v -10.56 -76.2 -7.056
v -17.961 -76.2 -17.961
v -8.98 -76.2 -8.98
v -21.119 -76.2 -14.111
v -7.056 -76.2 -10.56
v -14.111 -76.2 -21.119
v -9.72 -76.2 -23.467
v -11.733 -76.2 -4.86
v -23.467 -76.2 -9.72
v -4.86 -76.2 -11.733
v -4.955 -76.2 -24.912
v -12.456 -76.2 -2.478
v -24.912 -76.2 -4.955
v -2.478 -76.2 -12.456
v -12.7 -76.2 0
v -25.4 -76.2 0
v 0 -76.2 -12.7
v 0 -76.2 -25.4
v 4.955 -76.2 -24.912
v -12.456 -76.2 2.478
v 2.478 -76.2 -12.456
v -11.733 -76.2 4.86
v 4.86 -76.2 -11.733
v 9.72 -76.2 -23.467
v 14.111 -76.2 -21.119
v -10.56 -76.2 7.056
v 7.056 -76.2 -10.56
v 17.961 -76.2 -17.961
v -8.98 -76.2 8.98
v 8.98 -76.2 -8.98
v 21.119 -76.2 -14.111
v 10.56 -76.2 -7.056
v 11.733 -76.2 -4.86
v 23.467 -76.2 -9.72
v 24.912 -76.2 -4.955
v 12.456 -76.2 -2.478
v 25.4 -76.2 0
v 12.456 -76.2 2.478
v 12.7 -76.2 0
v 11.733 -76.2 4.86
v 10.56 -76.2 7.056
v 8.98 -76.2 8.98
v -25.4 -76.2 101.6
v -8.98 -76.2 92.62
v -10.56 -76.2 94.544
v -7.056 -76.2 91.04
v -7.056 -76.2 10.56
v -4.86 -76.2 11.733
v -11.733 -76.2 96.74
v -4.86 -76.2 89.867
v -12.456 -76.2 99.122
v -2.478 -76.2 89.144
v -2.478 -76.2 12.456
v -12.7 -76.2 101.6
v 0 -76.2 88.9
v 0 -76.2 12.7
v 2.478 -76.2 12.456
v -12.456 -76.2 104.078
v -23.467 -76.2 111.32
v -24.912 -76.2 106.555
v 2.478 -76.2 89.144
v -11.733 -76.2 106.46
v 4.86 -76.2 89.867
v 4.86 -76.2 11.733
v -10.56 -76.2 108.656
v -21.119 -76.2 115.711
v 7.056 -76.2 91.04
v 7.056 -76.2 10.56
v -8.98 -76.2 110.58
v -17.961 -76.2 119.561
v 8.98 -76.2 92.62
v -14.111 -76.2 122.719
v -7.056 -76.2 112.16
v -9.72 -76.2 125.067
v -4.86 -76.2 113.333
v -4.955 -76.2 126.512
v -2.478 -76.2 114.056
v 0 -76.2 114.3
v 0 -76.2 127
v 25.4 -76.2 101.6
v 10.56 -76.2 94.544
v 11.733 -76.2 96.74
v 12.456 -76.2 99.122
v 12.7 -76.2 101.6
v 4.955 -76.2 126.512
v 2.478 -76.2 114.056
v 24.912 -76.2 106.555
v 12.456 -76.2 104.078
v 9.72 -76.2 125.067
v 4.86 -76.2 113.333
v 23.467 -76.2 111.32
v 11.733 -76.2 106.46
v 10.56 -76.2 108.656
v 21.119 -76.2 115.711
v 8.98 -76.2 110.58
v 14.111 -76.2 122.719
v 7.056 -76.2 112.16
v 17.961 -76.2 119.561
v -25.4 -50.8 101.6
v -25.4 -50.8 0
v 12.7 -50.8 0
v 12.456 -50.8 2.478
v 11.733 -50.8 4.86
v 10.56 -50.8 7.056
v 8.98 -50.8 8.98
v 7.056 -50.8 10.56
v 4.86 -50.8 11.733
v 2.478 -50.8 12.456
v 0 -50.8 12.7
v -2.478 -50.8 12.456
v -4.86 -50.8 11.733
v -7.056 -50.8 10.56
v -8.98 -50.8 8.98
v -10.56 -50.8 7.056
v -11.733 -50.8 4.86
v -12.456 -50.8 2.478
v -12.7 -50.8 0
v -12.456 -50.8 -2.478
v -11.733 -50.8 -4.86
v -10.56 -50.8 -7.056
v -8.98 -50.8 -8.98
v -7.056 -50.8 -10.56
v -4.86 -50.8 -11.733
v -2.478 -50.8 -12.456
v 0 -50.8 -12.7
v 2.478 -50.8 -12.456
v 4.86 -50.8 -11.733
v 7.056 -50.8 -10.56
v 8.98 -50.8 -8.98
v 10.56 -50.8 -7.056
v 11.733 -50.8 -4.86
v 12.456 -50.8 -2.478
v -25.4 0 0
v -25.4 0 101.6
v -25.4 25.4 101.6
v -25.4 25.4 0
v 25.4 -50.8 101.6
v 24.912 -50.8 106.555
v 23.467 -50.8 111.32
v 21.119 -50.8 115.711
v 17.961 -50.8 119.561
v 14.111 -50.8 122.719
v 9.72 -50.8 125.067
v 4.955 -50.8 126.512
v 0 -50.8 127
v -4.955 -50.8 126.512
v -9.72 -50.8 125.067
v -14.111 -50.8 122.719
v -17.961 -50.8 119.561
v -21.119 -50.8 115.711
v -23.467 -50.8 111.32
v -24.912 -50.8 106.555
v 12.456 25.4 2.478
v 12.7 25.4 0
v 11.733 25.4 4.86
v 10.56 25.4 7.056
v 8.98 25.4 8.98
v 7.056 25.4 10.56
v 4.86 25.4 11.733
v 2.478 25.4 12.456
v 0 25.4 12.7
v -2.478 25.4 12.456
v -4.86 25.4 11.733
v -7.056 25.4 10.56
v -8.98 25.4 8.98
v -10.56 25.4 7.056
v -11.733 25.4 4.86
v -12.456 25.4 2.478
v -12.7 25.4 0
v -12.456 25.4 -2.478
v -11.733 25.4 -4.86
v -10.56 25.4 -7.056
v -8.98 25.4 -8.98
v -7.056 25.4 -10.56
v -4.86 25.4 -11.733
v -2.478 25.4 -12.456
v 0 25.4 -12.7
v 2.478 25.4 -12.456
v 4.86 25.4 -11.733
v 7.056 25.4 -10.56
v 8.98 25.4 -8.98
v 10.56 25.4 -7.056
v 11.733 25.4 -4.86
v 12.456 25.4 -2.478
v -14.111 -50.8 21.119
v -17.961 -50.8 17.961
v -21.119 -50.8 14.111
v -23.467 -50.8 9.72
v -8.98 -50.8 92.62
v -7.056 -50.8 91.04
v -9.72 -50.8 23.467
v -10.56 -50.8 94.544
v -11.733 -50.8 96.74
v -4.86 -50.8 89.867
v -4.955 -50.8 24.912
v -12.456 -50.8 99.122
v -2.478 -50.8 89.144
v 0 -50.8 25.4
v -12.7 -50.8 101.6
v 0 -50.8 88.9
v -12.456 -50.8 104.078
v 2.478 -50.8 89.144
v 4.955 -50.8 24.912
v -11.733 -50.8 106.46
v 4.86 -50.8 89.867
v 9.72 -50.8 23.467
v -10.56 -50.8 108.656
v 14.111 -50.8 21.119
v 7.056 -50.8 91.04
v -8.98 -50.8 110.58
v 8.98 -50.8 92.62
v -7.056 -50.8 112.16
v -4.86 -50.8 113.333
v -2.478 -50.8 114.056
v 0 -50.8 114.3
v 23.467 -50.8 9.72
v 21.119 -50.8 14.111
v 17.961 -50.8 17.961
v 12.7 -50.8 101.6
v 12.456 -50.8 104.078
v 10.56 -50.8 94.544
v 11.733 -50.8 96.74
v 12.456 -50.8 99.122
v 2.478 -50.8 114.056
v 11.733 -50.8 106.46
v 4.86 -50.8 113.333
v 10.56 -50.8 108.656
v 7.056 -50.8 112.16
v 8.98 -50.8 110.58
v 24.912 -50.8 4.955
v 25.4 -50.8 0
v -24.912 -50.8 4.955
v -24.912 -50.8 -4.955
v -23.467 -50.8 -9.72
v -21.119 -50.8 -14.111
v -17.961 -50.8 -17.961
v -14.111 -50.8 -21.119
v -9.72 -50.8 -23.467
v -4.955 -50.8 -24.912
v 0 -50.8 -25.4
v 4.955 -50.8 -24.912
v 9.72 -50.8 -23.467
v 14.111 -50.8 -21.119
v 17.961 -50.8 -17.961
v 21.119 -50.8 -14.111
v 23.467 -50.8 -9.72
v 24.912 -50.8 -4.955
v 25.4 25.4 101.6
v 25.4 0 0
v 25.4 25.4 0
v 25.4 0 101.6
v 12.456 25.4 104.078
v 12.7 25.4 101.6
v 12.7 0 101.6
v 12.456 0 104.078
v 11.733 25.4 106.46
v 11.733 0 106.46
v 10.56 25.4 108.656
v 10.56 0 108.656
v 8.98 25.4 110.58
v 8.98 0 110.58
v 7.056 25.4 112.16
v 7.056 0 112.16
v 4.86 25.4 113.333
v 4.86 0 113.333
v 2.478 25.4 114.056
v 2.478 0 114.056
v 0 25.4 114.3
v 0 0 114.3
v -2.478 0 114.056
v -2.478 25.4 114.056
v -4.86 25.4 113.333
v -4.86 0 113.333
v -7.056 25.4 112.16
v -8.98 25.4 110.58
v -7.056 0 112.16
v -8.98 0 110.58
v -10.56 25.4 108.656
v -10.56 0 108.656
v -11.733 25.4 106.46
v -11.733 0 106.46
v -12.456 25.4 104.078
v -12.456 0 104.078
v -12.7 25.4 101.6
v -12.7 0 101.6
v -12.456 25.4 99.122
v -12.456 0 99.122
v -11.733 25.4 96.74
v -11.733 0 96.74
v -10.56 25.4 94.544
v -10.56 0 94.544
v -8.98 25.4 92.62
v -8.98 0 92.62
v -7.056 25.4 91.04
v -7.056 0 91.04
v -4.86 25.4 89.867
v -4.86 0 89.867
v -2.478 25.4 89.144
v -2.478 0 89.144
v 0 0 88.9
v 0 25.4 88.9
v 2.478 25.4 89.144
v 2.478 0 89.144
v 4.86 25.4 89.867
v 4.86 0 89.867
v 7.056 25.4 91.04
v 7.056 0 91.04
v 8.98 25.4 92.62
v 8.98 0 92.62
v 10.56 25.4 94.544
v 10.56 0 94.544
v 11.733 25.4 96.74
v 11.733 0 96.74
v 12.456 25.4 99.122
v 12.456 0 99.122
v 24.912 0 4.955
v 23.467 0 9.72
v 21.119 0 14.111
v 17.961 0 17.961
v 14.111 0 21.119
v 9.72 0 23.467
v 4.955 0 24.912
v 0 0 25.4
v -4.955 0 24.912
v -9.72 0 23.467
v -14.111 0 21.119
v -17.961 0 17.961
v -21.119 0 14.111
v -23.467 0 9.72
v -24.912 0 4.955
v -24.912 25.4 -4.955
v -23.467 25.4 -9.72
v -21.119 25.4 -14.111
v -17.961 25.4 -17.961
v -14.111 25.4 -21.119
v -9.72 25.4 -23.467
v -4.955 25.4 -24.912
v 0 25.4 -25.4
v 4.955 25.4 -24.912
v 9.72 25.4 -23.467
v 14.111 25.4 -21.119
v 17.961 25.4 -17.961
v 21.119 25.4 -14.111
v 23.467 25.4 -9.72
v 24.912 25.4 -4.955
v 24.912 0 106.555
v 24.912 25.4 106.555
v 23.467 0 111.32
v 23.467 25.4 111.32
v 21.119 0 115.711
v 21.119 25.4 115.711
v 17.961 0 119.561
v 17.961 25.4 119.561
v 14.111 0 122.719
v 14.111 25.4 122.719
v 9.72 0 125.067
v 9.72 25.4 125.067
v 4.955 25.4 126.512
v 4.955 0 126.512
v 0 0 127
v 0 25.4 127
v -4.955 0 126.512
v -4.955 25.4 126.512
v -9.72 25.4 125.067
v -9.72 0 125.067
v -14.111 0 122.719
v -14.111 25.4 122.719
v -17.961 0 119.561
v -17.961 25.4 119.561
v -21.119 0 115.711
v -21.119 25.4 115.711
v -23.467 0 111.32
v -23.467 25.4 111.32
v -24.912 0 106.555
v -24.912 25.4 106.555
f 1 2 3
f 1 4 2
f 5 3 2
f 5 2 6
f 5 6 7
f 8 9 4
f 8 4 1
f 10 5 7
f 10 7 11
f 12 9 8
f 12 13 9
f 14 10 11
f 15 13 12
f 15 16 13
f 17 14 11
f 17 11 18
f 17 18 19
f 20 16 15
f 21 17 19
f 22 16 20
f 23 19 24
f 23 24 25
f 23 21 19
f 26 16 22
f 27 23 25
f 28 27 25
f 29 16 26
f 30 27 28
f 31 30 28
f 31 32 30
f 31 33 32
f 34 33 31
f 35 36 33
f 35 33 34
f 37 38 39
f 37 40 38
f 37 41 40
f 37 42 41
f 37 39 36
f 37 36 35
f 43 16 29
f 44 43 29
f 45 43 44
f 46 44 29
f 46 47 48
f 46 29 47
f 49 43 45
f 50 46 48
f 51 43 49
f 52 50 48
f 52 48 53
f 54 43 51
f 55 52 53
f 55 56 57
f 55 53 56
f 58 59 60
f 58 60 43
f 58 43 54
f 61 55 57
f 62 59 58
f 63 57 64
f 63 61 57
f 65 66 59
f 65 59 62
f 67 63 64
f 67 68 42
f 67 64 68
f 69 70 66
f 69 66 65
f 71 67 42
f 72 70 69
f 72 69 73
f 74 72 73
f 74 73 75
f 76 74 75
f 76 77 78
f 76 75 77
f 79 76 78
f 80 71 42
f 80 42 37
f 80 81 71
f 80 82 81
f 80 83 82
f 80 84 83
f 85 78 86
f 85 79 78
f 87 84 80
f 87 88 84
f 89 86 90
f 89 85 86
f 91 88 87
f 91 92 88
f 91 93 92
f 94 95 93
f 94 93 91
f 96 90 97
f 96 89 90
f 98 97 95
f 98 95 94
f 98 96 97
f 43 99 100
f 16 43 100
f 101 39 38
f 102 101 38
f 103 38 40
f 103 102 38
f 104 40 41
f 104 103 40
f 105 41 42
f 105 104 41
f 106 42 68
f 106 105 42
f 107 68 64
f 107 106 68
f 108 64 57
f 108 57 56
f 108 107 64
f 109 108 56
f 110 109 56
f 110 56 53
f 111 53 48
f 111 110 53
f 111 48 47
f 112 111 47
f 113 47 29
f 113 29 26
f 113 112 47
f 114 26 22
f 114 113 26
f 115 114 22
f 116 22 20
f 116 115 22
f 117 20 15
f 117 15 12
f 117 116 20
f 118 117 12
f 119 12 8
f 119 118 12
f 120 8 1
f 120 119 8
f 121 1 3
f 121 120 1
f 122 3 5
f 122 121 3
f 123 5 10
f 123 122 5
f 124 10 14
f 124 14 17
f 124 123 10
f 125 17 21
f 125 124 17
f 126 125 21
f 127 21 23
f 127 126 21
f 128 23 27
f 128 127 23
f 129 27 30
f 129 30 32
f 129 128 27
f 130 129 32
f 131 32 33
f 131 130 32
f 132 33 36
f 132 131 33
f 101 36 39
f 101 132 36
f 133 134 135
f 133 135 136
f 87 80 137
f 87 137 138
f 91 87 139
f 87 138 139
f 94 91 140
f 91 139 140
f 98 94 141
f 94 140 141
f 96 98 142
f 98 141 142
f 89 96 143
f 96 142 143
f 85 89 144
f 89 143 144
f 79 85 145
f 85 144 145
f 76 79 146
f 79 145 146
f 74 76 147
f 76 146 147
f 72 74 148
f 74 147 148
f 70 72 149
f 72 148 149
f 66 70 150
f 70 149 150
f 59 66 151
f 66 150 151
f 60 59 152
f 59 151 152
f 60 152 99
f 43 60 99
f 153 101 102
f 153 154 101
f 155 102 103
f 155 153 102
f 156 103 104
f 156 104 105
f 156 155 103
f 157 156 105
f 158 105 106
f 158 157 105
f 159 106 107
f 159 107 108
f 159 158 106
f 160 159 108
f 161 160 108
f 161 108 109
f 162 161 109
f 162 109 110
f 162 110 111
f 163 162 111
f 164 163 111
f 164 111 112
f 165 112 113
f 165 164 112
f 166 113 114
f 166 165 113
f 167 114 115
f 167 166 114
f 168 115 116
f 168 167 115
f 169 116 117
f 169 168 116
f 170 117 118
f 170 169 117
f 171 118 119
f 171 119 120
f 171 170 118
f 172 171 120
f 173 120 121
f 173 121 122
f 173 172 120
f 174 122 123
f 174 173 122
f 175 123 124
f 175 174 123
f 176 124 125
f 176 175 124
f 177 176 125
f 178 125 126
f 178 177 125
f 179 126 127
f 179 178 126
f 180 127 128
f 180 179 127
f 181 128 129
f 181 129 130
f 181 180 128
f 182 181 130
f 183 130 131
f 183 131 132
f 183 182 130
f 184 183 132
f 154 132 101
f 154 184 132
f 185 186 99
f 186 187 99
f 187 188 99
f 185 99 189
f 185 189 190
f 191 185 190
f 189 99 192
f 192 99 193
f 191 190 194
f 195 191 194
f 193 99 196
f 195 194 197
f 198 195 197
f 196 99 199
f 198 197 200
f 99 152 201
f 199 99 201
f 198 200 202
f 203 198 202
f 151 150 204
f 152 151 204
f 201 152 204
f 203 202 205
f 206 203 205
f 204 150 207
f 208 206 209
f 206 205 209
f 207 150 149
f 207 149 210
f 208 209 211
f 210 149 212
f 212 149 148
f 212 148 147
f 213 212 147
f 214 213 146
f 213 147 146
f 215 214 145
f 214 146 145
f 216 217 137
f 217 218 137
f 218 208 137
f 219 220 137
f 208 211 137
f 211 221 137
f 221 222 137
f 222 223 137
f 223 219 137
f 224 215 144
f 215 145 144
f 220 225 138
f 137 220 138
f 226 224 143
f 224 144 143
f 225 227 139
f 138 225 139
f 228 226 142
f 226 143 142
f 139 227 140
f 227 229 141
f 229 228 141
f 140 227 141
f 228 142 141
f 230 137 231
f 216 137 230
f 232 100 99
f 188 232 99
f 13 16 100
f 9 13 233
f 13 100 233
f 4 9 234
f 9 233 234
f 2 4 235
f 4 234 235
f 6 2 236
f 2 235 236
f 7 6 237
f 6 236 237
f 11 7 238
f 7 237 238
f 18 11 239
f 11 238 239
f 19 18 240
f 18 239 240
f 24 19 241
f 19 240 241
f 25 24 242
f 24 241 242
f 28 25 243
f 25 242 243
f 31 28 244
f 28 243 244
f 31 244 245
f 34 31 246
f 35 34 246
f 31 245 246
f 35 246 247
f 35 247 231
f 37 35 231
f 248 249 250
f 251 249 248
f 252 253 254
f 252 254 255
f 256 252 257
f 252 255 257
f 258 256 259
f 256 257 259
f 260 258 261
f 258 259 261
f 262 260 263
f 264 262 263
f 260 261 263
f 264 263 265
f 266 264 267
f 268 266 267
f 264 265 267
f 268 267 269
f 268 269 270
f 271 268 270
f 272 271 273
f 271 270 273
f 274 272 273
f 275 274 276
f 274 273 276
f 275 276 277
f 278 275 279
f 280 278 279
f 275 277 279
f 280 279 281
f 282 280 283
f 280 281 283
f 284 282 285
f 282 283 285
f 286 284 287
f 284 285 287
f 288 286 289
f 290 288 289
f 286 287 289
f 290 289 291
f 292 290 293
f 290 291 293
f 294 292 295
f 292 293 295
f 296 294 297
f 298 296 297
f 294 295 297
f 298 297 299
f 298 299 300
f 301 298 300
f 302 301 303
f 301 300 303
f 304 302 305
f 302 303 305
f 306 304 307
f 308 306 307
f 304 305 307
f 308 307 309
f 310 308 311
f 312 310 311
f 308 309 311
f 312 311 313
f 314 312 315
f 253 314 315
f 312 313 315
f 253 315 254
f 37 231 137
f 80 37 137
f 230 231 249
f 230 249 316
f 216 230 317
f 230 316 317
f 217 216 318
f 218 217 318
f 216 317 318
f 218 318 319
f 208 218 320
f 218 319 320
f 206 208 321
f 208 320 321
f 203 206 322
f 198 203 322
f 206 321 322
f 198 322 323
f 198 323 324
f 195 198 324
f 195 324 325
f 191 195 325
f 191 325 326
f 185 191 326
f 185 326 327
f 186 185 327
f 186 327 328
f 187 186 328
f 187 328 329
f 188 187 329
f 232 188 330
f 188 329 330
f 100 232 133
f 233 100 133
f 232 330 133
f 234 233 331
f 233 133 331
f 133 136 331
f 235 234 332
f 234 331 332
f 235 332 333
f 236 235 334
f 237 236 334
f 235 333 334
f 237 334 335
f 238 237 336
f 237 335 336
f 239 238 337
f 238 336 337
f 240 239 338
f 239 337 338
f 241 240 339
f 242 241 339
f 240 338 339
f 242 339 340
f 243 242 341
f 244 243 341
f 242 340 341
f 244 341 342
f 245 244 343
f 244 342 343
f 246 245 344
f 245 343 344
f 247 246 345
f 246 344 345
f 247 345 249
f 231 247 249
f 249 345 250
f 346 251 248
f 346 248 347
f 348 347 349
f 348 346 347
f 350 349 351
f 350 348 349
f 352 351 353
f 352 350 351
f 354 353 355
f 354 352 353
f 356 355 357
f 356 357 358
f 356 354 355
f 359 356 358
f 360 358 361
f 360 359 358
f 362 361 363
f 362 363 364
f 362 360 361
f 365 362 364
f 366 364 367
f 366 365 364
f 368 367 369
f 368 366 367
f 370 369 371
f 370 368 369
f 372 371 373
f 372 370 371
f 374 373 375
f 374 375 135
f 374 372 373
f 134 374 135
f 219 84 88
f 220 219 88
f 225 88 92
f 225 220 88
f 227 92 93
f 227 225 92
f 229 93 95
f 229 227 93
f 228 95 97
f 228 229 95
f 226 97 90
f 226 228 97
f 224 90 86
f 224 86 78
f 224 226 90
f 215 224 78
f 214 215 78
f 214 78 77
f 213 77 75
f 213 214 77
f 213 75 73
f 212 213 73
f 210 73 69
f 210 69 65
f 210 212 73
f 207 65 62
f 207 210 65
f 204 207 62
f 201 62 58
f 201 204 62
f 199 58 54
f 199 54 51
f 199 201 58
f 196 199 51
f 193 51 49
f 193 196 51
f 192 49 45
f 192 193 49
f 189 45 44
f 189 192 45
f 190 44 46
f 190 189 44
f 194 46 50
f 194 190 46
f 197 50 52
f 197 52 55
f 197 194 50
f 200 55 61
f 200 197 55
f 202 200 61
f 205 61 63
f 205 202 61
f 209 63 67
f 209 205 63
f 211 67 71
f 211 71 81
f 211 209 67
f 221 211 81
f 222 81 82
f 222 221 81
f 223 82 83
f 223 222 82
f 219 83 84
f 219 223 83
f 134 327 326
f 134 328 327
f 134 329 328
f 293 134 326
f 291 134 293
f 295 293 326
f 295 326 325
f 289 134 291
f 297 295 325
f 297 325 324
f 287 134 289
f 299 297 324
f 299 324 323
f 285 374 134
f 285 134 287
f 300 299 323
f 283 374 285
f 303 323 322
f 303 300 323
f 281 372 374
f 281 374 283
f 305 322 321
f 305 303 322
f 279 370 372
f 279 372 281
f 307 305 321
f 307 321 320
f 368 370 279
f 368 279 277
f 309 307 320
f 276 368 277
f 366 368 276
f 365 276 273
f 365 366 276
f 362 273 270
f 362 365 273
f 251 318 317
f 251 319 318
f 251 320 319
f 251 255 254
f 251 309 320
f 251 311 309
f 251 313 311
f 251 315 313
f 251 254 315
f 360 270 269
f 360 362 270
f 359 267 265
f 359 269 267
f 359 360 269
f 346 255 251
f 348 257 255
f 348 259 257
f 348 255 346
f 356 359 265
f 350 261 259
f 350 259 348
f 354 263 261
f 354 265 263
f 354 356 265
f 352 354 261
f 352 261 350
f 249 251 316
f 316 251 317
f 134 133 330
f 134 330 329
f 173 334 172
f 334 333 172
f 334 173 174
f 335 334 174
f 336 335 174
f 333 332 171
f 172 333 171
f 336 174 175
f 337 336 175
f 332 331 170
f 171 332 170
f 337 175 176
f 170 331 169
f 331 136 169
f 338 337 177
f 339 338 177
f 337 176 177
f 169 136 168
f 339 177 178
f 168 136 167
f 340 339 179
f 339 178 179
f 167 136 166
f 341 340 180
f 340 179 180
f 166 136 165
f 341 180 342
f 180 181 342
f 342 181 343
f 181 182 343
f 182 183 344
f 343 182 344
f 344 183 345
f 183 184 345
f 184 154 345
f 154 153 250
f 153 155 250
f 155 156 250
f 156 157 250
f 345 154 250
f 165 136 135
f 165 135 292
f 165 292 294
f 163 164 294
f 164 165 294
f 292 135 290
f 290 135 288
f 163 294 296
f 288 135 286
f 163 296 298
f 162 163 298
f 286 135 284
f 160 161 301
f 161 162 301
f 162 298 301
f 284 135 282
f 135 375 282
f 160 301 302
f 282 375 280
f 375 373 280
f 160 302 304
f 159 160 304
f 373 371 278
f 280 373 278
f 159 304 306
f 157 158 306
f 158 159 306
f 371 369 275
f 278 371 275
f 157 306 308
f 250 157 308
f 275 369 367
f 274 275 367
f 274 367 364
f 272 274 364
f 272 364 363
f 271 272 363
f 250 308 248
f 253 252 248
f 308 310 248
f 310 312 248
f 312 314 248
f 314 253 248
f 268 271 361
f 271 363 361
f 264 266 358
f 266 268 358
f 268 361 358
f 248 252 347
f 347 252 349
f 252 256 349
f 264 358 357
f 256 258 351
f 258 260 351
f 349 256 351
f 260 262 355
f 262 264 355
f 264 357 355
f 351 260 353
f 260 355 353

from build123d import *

# Parameters (mm, degrees)
F0_R     = 12.7
F1_DEPTH = 25.4
F2_DEPTH = 50.8
F3_R     = 12.7
F4_DEPTH = 25.4


with BuildPart() as f1:
    # F0 (on Front) → F1 (new body)
    with BuildSketch(Plane.XZ):
        with BuildLine():
            ThreePointArc((-25.4, 101.6), (0, 76.2), (25.4, 101.6))
            ThreePointArc((25.4, 101.6), (0, 127), (-25.4, 101.6))
        make_face()
        with Locations((0, 101.6)):
            Circle(F0_R, mode=Mode.SUBTRACT)
        with BuildLine():
            ThreePointArc((-25.4, 0), (0, 25.4), (25.4, 0))
            Line((25.4, 0), (25.4, 101.6))
            ThreePointArc((25.4, 101.6), (0, 76.2), (-25.4, 101.6))
            Line((-25.4, 101.6), (-25.4, 0))
        make_face()
        with BuildLine():
            ThreePointArc((-25.4, 0), (0, -25.4), (25.4, 0))
            ThreePointArc((25.4, 0), (0, 25.4), (-25.4, 0))
        make_face()
        Circle(F0_R, mode=Mode.SUBTRACT)
    extrude(amount=-F1_DEPTH)

    # F0 (on Front) → F2 (join)
    with BuildSketch(Plane.XZ):
        with BuildLine():
            ThreePointArc((-25.4, 0), (0, -25.4), (25.4, 0))
            ThreePointArc((25.4, 0), (0, 25.4), (-25.4, 0))
        make_face()
        Circle(F0_R, mode=Mode.SUBTRACT)
    extrude(amount=F2_DEPTH)

    # F3 (on face) → F4 (join)
    with BuildSketch(Plane.XZ.offset(50.8)):
        with BuildLine():
            ThreePointArc((25.4, 101.6), (0, 127), (-25.4, 101.6))
            ThreePointArc((-25.4, 101.6), (0, 76.2), (25.4, 101.6))
        make_face()
        with Locations((0, 101.6)):
            Circle(F3_R, mode=Mode.SUBTRACT)
        with BuildLine():
            ThreePointArc((25.4, 101.6), (0, 76.2), (-25.4, 101.6))
            Line((-25.4, 101.6), (-25.4, 0))
            ThreePointArc((-25.4, 0), (0, 25.4), (25.4, 0))
            Line((25.4, 0), (25.4, 101.6))
        make_face()
        with BuildLine():
            ThreePointArc((25.4, 0), (0, 25.4), (-25.4, 0))
            ThreePointArc((-25.4, 0), (0, -25.4), (25.4, 0))
        make_face()
        Circle(F3_R, mode=Mode.SUBTRACT)
    extrude(amount=F4_DEPTH)


solid = f1.part
